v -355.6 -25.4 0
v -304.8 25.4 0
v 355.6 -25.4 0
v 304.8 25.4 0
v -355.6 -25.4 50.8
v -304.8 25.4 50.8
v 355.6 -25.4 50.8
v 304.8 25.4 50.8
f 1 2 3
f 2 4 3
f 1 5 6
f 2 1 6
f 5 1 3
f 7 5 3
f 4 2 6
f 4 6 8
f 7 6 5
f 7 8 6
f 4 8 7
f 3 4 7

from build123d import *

# Parameters (mm, degrees)
CROQUIS1_W              = 711.2
CROQUIS1_H              = 50.8
SALIENTE_EXTRUIR1_DEPTH = 50.8
CORTAR_EXTRUIR1_DEPTH   = 361.10715072
CORTAR_EXTRUIR2_DEPTH   = 361.10715072


with BuildPart() as part:
    # Croquis1 → Saliente-Extruir1 (new body)
    with BuildSketch(Plane.XY):
        Rectangle(CROQUIS1_W, CROQUIS1_H)
    extrude(amount=SALIENTE_EXTRUIR1_DEPTH)

    # Croquis2 → Cortar-Extruir1 (cut, through all)
    with BuildSketch(Plane.XY.offset(50.8)):
        Polygon((355.6, 25.4), (335.6, 25.4), (355.6, -25.4), align=None)
        Polygon((-335.6, 25.4), (-355.6, 25.4), (-355.6, -25.4), align=None)
    extrude(amount=-CORTAR_EXTRUIR1_DEPTH, mode=Mode.SUBTRACT)

    # Croquis3 → Cortar-Extruir2 (cut, through all)
    with BuildSketch(Plane.XY.offset(50.8)):
        Polygon((-335.6, 25.4), (-355.6, -25.4), (-304.8, 25.4), align=None)
        Polygon((335.6, 25.4), (304.8, 25.4), (355.6, -25.4), align=None)
    extrude(amount=-CORTAR_EXTRUIR2_DEPTH, mode=Mode.SUBTRACT)


solid = part.part
